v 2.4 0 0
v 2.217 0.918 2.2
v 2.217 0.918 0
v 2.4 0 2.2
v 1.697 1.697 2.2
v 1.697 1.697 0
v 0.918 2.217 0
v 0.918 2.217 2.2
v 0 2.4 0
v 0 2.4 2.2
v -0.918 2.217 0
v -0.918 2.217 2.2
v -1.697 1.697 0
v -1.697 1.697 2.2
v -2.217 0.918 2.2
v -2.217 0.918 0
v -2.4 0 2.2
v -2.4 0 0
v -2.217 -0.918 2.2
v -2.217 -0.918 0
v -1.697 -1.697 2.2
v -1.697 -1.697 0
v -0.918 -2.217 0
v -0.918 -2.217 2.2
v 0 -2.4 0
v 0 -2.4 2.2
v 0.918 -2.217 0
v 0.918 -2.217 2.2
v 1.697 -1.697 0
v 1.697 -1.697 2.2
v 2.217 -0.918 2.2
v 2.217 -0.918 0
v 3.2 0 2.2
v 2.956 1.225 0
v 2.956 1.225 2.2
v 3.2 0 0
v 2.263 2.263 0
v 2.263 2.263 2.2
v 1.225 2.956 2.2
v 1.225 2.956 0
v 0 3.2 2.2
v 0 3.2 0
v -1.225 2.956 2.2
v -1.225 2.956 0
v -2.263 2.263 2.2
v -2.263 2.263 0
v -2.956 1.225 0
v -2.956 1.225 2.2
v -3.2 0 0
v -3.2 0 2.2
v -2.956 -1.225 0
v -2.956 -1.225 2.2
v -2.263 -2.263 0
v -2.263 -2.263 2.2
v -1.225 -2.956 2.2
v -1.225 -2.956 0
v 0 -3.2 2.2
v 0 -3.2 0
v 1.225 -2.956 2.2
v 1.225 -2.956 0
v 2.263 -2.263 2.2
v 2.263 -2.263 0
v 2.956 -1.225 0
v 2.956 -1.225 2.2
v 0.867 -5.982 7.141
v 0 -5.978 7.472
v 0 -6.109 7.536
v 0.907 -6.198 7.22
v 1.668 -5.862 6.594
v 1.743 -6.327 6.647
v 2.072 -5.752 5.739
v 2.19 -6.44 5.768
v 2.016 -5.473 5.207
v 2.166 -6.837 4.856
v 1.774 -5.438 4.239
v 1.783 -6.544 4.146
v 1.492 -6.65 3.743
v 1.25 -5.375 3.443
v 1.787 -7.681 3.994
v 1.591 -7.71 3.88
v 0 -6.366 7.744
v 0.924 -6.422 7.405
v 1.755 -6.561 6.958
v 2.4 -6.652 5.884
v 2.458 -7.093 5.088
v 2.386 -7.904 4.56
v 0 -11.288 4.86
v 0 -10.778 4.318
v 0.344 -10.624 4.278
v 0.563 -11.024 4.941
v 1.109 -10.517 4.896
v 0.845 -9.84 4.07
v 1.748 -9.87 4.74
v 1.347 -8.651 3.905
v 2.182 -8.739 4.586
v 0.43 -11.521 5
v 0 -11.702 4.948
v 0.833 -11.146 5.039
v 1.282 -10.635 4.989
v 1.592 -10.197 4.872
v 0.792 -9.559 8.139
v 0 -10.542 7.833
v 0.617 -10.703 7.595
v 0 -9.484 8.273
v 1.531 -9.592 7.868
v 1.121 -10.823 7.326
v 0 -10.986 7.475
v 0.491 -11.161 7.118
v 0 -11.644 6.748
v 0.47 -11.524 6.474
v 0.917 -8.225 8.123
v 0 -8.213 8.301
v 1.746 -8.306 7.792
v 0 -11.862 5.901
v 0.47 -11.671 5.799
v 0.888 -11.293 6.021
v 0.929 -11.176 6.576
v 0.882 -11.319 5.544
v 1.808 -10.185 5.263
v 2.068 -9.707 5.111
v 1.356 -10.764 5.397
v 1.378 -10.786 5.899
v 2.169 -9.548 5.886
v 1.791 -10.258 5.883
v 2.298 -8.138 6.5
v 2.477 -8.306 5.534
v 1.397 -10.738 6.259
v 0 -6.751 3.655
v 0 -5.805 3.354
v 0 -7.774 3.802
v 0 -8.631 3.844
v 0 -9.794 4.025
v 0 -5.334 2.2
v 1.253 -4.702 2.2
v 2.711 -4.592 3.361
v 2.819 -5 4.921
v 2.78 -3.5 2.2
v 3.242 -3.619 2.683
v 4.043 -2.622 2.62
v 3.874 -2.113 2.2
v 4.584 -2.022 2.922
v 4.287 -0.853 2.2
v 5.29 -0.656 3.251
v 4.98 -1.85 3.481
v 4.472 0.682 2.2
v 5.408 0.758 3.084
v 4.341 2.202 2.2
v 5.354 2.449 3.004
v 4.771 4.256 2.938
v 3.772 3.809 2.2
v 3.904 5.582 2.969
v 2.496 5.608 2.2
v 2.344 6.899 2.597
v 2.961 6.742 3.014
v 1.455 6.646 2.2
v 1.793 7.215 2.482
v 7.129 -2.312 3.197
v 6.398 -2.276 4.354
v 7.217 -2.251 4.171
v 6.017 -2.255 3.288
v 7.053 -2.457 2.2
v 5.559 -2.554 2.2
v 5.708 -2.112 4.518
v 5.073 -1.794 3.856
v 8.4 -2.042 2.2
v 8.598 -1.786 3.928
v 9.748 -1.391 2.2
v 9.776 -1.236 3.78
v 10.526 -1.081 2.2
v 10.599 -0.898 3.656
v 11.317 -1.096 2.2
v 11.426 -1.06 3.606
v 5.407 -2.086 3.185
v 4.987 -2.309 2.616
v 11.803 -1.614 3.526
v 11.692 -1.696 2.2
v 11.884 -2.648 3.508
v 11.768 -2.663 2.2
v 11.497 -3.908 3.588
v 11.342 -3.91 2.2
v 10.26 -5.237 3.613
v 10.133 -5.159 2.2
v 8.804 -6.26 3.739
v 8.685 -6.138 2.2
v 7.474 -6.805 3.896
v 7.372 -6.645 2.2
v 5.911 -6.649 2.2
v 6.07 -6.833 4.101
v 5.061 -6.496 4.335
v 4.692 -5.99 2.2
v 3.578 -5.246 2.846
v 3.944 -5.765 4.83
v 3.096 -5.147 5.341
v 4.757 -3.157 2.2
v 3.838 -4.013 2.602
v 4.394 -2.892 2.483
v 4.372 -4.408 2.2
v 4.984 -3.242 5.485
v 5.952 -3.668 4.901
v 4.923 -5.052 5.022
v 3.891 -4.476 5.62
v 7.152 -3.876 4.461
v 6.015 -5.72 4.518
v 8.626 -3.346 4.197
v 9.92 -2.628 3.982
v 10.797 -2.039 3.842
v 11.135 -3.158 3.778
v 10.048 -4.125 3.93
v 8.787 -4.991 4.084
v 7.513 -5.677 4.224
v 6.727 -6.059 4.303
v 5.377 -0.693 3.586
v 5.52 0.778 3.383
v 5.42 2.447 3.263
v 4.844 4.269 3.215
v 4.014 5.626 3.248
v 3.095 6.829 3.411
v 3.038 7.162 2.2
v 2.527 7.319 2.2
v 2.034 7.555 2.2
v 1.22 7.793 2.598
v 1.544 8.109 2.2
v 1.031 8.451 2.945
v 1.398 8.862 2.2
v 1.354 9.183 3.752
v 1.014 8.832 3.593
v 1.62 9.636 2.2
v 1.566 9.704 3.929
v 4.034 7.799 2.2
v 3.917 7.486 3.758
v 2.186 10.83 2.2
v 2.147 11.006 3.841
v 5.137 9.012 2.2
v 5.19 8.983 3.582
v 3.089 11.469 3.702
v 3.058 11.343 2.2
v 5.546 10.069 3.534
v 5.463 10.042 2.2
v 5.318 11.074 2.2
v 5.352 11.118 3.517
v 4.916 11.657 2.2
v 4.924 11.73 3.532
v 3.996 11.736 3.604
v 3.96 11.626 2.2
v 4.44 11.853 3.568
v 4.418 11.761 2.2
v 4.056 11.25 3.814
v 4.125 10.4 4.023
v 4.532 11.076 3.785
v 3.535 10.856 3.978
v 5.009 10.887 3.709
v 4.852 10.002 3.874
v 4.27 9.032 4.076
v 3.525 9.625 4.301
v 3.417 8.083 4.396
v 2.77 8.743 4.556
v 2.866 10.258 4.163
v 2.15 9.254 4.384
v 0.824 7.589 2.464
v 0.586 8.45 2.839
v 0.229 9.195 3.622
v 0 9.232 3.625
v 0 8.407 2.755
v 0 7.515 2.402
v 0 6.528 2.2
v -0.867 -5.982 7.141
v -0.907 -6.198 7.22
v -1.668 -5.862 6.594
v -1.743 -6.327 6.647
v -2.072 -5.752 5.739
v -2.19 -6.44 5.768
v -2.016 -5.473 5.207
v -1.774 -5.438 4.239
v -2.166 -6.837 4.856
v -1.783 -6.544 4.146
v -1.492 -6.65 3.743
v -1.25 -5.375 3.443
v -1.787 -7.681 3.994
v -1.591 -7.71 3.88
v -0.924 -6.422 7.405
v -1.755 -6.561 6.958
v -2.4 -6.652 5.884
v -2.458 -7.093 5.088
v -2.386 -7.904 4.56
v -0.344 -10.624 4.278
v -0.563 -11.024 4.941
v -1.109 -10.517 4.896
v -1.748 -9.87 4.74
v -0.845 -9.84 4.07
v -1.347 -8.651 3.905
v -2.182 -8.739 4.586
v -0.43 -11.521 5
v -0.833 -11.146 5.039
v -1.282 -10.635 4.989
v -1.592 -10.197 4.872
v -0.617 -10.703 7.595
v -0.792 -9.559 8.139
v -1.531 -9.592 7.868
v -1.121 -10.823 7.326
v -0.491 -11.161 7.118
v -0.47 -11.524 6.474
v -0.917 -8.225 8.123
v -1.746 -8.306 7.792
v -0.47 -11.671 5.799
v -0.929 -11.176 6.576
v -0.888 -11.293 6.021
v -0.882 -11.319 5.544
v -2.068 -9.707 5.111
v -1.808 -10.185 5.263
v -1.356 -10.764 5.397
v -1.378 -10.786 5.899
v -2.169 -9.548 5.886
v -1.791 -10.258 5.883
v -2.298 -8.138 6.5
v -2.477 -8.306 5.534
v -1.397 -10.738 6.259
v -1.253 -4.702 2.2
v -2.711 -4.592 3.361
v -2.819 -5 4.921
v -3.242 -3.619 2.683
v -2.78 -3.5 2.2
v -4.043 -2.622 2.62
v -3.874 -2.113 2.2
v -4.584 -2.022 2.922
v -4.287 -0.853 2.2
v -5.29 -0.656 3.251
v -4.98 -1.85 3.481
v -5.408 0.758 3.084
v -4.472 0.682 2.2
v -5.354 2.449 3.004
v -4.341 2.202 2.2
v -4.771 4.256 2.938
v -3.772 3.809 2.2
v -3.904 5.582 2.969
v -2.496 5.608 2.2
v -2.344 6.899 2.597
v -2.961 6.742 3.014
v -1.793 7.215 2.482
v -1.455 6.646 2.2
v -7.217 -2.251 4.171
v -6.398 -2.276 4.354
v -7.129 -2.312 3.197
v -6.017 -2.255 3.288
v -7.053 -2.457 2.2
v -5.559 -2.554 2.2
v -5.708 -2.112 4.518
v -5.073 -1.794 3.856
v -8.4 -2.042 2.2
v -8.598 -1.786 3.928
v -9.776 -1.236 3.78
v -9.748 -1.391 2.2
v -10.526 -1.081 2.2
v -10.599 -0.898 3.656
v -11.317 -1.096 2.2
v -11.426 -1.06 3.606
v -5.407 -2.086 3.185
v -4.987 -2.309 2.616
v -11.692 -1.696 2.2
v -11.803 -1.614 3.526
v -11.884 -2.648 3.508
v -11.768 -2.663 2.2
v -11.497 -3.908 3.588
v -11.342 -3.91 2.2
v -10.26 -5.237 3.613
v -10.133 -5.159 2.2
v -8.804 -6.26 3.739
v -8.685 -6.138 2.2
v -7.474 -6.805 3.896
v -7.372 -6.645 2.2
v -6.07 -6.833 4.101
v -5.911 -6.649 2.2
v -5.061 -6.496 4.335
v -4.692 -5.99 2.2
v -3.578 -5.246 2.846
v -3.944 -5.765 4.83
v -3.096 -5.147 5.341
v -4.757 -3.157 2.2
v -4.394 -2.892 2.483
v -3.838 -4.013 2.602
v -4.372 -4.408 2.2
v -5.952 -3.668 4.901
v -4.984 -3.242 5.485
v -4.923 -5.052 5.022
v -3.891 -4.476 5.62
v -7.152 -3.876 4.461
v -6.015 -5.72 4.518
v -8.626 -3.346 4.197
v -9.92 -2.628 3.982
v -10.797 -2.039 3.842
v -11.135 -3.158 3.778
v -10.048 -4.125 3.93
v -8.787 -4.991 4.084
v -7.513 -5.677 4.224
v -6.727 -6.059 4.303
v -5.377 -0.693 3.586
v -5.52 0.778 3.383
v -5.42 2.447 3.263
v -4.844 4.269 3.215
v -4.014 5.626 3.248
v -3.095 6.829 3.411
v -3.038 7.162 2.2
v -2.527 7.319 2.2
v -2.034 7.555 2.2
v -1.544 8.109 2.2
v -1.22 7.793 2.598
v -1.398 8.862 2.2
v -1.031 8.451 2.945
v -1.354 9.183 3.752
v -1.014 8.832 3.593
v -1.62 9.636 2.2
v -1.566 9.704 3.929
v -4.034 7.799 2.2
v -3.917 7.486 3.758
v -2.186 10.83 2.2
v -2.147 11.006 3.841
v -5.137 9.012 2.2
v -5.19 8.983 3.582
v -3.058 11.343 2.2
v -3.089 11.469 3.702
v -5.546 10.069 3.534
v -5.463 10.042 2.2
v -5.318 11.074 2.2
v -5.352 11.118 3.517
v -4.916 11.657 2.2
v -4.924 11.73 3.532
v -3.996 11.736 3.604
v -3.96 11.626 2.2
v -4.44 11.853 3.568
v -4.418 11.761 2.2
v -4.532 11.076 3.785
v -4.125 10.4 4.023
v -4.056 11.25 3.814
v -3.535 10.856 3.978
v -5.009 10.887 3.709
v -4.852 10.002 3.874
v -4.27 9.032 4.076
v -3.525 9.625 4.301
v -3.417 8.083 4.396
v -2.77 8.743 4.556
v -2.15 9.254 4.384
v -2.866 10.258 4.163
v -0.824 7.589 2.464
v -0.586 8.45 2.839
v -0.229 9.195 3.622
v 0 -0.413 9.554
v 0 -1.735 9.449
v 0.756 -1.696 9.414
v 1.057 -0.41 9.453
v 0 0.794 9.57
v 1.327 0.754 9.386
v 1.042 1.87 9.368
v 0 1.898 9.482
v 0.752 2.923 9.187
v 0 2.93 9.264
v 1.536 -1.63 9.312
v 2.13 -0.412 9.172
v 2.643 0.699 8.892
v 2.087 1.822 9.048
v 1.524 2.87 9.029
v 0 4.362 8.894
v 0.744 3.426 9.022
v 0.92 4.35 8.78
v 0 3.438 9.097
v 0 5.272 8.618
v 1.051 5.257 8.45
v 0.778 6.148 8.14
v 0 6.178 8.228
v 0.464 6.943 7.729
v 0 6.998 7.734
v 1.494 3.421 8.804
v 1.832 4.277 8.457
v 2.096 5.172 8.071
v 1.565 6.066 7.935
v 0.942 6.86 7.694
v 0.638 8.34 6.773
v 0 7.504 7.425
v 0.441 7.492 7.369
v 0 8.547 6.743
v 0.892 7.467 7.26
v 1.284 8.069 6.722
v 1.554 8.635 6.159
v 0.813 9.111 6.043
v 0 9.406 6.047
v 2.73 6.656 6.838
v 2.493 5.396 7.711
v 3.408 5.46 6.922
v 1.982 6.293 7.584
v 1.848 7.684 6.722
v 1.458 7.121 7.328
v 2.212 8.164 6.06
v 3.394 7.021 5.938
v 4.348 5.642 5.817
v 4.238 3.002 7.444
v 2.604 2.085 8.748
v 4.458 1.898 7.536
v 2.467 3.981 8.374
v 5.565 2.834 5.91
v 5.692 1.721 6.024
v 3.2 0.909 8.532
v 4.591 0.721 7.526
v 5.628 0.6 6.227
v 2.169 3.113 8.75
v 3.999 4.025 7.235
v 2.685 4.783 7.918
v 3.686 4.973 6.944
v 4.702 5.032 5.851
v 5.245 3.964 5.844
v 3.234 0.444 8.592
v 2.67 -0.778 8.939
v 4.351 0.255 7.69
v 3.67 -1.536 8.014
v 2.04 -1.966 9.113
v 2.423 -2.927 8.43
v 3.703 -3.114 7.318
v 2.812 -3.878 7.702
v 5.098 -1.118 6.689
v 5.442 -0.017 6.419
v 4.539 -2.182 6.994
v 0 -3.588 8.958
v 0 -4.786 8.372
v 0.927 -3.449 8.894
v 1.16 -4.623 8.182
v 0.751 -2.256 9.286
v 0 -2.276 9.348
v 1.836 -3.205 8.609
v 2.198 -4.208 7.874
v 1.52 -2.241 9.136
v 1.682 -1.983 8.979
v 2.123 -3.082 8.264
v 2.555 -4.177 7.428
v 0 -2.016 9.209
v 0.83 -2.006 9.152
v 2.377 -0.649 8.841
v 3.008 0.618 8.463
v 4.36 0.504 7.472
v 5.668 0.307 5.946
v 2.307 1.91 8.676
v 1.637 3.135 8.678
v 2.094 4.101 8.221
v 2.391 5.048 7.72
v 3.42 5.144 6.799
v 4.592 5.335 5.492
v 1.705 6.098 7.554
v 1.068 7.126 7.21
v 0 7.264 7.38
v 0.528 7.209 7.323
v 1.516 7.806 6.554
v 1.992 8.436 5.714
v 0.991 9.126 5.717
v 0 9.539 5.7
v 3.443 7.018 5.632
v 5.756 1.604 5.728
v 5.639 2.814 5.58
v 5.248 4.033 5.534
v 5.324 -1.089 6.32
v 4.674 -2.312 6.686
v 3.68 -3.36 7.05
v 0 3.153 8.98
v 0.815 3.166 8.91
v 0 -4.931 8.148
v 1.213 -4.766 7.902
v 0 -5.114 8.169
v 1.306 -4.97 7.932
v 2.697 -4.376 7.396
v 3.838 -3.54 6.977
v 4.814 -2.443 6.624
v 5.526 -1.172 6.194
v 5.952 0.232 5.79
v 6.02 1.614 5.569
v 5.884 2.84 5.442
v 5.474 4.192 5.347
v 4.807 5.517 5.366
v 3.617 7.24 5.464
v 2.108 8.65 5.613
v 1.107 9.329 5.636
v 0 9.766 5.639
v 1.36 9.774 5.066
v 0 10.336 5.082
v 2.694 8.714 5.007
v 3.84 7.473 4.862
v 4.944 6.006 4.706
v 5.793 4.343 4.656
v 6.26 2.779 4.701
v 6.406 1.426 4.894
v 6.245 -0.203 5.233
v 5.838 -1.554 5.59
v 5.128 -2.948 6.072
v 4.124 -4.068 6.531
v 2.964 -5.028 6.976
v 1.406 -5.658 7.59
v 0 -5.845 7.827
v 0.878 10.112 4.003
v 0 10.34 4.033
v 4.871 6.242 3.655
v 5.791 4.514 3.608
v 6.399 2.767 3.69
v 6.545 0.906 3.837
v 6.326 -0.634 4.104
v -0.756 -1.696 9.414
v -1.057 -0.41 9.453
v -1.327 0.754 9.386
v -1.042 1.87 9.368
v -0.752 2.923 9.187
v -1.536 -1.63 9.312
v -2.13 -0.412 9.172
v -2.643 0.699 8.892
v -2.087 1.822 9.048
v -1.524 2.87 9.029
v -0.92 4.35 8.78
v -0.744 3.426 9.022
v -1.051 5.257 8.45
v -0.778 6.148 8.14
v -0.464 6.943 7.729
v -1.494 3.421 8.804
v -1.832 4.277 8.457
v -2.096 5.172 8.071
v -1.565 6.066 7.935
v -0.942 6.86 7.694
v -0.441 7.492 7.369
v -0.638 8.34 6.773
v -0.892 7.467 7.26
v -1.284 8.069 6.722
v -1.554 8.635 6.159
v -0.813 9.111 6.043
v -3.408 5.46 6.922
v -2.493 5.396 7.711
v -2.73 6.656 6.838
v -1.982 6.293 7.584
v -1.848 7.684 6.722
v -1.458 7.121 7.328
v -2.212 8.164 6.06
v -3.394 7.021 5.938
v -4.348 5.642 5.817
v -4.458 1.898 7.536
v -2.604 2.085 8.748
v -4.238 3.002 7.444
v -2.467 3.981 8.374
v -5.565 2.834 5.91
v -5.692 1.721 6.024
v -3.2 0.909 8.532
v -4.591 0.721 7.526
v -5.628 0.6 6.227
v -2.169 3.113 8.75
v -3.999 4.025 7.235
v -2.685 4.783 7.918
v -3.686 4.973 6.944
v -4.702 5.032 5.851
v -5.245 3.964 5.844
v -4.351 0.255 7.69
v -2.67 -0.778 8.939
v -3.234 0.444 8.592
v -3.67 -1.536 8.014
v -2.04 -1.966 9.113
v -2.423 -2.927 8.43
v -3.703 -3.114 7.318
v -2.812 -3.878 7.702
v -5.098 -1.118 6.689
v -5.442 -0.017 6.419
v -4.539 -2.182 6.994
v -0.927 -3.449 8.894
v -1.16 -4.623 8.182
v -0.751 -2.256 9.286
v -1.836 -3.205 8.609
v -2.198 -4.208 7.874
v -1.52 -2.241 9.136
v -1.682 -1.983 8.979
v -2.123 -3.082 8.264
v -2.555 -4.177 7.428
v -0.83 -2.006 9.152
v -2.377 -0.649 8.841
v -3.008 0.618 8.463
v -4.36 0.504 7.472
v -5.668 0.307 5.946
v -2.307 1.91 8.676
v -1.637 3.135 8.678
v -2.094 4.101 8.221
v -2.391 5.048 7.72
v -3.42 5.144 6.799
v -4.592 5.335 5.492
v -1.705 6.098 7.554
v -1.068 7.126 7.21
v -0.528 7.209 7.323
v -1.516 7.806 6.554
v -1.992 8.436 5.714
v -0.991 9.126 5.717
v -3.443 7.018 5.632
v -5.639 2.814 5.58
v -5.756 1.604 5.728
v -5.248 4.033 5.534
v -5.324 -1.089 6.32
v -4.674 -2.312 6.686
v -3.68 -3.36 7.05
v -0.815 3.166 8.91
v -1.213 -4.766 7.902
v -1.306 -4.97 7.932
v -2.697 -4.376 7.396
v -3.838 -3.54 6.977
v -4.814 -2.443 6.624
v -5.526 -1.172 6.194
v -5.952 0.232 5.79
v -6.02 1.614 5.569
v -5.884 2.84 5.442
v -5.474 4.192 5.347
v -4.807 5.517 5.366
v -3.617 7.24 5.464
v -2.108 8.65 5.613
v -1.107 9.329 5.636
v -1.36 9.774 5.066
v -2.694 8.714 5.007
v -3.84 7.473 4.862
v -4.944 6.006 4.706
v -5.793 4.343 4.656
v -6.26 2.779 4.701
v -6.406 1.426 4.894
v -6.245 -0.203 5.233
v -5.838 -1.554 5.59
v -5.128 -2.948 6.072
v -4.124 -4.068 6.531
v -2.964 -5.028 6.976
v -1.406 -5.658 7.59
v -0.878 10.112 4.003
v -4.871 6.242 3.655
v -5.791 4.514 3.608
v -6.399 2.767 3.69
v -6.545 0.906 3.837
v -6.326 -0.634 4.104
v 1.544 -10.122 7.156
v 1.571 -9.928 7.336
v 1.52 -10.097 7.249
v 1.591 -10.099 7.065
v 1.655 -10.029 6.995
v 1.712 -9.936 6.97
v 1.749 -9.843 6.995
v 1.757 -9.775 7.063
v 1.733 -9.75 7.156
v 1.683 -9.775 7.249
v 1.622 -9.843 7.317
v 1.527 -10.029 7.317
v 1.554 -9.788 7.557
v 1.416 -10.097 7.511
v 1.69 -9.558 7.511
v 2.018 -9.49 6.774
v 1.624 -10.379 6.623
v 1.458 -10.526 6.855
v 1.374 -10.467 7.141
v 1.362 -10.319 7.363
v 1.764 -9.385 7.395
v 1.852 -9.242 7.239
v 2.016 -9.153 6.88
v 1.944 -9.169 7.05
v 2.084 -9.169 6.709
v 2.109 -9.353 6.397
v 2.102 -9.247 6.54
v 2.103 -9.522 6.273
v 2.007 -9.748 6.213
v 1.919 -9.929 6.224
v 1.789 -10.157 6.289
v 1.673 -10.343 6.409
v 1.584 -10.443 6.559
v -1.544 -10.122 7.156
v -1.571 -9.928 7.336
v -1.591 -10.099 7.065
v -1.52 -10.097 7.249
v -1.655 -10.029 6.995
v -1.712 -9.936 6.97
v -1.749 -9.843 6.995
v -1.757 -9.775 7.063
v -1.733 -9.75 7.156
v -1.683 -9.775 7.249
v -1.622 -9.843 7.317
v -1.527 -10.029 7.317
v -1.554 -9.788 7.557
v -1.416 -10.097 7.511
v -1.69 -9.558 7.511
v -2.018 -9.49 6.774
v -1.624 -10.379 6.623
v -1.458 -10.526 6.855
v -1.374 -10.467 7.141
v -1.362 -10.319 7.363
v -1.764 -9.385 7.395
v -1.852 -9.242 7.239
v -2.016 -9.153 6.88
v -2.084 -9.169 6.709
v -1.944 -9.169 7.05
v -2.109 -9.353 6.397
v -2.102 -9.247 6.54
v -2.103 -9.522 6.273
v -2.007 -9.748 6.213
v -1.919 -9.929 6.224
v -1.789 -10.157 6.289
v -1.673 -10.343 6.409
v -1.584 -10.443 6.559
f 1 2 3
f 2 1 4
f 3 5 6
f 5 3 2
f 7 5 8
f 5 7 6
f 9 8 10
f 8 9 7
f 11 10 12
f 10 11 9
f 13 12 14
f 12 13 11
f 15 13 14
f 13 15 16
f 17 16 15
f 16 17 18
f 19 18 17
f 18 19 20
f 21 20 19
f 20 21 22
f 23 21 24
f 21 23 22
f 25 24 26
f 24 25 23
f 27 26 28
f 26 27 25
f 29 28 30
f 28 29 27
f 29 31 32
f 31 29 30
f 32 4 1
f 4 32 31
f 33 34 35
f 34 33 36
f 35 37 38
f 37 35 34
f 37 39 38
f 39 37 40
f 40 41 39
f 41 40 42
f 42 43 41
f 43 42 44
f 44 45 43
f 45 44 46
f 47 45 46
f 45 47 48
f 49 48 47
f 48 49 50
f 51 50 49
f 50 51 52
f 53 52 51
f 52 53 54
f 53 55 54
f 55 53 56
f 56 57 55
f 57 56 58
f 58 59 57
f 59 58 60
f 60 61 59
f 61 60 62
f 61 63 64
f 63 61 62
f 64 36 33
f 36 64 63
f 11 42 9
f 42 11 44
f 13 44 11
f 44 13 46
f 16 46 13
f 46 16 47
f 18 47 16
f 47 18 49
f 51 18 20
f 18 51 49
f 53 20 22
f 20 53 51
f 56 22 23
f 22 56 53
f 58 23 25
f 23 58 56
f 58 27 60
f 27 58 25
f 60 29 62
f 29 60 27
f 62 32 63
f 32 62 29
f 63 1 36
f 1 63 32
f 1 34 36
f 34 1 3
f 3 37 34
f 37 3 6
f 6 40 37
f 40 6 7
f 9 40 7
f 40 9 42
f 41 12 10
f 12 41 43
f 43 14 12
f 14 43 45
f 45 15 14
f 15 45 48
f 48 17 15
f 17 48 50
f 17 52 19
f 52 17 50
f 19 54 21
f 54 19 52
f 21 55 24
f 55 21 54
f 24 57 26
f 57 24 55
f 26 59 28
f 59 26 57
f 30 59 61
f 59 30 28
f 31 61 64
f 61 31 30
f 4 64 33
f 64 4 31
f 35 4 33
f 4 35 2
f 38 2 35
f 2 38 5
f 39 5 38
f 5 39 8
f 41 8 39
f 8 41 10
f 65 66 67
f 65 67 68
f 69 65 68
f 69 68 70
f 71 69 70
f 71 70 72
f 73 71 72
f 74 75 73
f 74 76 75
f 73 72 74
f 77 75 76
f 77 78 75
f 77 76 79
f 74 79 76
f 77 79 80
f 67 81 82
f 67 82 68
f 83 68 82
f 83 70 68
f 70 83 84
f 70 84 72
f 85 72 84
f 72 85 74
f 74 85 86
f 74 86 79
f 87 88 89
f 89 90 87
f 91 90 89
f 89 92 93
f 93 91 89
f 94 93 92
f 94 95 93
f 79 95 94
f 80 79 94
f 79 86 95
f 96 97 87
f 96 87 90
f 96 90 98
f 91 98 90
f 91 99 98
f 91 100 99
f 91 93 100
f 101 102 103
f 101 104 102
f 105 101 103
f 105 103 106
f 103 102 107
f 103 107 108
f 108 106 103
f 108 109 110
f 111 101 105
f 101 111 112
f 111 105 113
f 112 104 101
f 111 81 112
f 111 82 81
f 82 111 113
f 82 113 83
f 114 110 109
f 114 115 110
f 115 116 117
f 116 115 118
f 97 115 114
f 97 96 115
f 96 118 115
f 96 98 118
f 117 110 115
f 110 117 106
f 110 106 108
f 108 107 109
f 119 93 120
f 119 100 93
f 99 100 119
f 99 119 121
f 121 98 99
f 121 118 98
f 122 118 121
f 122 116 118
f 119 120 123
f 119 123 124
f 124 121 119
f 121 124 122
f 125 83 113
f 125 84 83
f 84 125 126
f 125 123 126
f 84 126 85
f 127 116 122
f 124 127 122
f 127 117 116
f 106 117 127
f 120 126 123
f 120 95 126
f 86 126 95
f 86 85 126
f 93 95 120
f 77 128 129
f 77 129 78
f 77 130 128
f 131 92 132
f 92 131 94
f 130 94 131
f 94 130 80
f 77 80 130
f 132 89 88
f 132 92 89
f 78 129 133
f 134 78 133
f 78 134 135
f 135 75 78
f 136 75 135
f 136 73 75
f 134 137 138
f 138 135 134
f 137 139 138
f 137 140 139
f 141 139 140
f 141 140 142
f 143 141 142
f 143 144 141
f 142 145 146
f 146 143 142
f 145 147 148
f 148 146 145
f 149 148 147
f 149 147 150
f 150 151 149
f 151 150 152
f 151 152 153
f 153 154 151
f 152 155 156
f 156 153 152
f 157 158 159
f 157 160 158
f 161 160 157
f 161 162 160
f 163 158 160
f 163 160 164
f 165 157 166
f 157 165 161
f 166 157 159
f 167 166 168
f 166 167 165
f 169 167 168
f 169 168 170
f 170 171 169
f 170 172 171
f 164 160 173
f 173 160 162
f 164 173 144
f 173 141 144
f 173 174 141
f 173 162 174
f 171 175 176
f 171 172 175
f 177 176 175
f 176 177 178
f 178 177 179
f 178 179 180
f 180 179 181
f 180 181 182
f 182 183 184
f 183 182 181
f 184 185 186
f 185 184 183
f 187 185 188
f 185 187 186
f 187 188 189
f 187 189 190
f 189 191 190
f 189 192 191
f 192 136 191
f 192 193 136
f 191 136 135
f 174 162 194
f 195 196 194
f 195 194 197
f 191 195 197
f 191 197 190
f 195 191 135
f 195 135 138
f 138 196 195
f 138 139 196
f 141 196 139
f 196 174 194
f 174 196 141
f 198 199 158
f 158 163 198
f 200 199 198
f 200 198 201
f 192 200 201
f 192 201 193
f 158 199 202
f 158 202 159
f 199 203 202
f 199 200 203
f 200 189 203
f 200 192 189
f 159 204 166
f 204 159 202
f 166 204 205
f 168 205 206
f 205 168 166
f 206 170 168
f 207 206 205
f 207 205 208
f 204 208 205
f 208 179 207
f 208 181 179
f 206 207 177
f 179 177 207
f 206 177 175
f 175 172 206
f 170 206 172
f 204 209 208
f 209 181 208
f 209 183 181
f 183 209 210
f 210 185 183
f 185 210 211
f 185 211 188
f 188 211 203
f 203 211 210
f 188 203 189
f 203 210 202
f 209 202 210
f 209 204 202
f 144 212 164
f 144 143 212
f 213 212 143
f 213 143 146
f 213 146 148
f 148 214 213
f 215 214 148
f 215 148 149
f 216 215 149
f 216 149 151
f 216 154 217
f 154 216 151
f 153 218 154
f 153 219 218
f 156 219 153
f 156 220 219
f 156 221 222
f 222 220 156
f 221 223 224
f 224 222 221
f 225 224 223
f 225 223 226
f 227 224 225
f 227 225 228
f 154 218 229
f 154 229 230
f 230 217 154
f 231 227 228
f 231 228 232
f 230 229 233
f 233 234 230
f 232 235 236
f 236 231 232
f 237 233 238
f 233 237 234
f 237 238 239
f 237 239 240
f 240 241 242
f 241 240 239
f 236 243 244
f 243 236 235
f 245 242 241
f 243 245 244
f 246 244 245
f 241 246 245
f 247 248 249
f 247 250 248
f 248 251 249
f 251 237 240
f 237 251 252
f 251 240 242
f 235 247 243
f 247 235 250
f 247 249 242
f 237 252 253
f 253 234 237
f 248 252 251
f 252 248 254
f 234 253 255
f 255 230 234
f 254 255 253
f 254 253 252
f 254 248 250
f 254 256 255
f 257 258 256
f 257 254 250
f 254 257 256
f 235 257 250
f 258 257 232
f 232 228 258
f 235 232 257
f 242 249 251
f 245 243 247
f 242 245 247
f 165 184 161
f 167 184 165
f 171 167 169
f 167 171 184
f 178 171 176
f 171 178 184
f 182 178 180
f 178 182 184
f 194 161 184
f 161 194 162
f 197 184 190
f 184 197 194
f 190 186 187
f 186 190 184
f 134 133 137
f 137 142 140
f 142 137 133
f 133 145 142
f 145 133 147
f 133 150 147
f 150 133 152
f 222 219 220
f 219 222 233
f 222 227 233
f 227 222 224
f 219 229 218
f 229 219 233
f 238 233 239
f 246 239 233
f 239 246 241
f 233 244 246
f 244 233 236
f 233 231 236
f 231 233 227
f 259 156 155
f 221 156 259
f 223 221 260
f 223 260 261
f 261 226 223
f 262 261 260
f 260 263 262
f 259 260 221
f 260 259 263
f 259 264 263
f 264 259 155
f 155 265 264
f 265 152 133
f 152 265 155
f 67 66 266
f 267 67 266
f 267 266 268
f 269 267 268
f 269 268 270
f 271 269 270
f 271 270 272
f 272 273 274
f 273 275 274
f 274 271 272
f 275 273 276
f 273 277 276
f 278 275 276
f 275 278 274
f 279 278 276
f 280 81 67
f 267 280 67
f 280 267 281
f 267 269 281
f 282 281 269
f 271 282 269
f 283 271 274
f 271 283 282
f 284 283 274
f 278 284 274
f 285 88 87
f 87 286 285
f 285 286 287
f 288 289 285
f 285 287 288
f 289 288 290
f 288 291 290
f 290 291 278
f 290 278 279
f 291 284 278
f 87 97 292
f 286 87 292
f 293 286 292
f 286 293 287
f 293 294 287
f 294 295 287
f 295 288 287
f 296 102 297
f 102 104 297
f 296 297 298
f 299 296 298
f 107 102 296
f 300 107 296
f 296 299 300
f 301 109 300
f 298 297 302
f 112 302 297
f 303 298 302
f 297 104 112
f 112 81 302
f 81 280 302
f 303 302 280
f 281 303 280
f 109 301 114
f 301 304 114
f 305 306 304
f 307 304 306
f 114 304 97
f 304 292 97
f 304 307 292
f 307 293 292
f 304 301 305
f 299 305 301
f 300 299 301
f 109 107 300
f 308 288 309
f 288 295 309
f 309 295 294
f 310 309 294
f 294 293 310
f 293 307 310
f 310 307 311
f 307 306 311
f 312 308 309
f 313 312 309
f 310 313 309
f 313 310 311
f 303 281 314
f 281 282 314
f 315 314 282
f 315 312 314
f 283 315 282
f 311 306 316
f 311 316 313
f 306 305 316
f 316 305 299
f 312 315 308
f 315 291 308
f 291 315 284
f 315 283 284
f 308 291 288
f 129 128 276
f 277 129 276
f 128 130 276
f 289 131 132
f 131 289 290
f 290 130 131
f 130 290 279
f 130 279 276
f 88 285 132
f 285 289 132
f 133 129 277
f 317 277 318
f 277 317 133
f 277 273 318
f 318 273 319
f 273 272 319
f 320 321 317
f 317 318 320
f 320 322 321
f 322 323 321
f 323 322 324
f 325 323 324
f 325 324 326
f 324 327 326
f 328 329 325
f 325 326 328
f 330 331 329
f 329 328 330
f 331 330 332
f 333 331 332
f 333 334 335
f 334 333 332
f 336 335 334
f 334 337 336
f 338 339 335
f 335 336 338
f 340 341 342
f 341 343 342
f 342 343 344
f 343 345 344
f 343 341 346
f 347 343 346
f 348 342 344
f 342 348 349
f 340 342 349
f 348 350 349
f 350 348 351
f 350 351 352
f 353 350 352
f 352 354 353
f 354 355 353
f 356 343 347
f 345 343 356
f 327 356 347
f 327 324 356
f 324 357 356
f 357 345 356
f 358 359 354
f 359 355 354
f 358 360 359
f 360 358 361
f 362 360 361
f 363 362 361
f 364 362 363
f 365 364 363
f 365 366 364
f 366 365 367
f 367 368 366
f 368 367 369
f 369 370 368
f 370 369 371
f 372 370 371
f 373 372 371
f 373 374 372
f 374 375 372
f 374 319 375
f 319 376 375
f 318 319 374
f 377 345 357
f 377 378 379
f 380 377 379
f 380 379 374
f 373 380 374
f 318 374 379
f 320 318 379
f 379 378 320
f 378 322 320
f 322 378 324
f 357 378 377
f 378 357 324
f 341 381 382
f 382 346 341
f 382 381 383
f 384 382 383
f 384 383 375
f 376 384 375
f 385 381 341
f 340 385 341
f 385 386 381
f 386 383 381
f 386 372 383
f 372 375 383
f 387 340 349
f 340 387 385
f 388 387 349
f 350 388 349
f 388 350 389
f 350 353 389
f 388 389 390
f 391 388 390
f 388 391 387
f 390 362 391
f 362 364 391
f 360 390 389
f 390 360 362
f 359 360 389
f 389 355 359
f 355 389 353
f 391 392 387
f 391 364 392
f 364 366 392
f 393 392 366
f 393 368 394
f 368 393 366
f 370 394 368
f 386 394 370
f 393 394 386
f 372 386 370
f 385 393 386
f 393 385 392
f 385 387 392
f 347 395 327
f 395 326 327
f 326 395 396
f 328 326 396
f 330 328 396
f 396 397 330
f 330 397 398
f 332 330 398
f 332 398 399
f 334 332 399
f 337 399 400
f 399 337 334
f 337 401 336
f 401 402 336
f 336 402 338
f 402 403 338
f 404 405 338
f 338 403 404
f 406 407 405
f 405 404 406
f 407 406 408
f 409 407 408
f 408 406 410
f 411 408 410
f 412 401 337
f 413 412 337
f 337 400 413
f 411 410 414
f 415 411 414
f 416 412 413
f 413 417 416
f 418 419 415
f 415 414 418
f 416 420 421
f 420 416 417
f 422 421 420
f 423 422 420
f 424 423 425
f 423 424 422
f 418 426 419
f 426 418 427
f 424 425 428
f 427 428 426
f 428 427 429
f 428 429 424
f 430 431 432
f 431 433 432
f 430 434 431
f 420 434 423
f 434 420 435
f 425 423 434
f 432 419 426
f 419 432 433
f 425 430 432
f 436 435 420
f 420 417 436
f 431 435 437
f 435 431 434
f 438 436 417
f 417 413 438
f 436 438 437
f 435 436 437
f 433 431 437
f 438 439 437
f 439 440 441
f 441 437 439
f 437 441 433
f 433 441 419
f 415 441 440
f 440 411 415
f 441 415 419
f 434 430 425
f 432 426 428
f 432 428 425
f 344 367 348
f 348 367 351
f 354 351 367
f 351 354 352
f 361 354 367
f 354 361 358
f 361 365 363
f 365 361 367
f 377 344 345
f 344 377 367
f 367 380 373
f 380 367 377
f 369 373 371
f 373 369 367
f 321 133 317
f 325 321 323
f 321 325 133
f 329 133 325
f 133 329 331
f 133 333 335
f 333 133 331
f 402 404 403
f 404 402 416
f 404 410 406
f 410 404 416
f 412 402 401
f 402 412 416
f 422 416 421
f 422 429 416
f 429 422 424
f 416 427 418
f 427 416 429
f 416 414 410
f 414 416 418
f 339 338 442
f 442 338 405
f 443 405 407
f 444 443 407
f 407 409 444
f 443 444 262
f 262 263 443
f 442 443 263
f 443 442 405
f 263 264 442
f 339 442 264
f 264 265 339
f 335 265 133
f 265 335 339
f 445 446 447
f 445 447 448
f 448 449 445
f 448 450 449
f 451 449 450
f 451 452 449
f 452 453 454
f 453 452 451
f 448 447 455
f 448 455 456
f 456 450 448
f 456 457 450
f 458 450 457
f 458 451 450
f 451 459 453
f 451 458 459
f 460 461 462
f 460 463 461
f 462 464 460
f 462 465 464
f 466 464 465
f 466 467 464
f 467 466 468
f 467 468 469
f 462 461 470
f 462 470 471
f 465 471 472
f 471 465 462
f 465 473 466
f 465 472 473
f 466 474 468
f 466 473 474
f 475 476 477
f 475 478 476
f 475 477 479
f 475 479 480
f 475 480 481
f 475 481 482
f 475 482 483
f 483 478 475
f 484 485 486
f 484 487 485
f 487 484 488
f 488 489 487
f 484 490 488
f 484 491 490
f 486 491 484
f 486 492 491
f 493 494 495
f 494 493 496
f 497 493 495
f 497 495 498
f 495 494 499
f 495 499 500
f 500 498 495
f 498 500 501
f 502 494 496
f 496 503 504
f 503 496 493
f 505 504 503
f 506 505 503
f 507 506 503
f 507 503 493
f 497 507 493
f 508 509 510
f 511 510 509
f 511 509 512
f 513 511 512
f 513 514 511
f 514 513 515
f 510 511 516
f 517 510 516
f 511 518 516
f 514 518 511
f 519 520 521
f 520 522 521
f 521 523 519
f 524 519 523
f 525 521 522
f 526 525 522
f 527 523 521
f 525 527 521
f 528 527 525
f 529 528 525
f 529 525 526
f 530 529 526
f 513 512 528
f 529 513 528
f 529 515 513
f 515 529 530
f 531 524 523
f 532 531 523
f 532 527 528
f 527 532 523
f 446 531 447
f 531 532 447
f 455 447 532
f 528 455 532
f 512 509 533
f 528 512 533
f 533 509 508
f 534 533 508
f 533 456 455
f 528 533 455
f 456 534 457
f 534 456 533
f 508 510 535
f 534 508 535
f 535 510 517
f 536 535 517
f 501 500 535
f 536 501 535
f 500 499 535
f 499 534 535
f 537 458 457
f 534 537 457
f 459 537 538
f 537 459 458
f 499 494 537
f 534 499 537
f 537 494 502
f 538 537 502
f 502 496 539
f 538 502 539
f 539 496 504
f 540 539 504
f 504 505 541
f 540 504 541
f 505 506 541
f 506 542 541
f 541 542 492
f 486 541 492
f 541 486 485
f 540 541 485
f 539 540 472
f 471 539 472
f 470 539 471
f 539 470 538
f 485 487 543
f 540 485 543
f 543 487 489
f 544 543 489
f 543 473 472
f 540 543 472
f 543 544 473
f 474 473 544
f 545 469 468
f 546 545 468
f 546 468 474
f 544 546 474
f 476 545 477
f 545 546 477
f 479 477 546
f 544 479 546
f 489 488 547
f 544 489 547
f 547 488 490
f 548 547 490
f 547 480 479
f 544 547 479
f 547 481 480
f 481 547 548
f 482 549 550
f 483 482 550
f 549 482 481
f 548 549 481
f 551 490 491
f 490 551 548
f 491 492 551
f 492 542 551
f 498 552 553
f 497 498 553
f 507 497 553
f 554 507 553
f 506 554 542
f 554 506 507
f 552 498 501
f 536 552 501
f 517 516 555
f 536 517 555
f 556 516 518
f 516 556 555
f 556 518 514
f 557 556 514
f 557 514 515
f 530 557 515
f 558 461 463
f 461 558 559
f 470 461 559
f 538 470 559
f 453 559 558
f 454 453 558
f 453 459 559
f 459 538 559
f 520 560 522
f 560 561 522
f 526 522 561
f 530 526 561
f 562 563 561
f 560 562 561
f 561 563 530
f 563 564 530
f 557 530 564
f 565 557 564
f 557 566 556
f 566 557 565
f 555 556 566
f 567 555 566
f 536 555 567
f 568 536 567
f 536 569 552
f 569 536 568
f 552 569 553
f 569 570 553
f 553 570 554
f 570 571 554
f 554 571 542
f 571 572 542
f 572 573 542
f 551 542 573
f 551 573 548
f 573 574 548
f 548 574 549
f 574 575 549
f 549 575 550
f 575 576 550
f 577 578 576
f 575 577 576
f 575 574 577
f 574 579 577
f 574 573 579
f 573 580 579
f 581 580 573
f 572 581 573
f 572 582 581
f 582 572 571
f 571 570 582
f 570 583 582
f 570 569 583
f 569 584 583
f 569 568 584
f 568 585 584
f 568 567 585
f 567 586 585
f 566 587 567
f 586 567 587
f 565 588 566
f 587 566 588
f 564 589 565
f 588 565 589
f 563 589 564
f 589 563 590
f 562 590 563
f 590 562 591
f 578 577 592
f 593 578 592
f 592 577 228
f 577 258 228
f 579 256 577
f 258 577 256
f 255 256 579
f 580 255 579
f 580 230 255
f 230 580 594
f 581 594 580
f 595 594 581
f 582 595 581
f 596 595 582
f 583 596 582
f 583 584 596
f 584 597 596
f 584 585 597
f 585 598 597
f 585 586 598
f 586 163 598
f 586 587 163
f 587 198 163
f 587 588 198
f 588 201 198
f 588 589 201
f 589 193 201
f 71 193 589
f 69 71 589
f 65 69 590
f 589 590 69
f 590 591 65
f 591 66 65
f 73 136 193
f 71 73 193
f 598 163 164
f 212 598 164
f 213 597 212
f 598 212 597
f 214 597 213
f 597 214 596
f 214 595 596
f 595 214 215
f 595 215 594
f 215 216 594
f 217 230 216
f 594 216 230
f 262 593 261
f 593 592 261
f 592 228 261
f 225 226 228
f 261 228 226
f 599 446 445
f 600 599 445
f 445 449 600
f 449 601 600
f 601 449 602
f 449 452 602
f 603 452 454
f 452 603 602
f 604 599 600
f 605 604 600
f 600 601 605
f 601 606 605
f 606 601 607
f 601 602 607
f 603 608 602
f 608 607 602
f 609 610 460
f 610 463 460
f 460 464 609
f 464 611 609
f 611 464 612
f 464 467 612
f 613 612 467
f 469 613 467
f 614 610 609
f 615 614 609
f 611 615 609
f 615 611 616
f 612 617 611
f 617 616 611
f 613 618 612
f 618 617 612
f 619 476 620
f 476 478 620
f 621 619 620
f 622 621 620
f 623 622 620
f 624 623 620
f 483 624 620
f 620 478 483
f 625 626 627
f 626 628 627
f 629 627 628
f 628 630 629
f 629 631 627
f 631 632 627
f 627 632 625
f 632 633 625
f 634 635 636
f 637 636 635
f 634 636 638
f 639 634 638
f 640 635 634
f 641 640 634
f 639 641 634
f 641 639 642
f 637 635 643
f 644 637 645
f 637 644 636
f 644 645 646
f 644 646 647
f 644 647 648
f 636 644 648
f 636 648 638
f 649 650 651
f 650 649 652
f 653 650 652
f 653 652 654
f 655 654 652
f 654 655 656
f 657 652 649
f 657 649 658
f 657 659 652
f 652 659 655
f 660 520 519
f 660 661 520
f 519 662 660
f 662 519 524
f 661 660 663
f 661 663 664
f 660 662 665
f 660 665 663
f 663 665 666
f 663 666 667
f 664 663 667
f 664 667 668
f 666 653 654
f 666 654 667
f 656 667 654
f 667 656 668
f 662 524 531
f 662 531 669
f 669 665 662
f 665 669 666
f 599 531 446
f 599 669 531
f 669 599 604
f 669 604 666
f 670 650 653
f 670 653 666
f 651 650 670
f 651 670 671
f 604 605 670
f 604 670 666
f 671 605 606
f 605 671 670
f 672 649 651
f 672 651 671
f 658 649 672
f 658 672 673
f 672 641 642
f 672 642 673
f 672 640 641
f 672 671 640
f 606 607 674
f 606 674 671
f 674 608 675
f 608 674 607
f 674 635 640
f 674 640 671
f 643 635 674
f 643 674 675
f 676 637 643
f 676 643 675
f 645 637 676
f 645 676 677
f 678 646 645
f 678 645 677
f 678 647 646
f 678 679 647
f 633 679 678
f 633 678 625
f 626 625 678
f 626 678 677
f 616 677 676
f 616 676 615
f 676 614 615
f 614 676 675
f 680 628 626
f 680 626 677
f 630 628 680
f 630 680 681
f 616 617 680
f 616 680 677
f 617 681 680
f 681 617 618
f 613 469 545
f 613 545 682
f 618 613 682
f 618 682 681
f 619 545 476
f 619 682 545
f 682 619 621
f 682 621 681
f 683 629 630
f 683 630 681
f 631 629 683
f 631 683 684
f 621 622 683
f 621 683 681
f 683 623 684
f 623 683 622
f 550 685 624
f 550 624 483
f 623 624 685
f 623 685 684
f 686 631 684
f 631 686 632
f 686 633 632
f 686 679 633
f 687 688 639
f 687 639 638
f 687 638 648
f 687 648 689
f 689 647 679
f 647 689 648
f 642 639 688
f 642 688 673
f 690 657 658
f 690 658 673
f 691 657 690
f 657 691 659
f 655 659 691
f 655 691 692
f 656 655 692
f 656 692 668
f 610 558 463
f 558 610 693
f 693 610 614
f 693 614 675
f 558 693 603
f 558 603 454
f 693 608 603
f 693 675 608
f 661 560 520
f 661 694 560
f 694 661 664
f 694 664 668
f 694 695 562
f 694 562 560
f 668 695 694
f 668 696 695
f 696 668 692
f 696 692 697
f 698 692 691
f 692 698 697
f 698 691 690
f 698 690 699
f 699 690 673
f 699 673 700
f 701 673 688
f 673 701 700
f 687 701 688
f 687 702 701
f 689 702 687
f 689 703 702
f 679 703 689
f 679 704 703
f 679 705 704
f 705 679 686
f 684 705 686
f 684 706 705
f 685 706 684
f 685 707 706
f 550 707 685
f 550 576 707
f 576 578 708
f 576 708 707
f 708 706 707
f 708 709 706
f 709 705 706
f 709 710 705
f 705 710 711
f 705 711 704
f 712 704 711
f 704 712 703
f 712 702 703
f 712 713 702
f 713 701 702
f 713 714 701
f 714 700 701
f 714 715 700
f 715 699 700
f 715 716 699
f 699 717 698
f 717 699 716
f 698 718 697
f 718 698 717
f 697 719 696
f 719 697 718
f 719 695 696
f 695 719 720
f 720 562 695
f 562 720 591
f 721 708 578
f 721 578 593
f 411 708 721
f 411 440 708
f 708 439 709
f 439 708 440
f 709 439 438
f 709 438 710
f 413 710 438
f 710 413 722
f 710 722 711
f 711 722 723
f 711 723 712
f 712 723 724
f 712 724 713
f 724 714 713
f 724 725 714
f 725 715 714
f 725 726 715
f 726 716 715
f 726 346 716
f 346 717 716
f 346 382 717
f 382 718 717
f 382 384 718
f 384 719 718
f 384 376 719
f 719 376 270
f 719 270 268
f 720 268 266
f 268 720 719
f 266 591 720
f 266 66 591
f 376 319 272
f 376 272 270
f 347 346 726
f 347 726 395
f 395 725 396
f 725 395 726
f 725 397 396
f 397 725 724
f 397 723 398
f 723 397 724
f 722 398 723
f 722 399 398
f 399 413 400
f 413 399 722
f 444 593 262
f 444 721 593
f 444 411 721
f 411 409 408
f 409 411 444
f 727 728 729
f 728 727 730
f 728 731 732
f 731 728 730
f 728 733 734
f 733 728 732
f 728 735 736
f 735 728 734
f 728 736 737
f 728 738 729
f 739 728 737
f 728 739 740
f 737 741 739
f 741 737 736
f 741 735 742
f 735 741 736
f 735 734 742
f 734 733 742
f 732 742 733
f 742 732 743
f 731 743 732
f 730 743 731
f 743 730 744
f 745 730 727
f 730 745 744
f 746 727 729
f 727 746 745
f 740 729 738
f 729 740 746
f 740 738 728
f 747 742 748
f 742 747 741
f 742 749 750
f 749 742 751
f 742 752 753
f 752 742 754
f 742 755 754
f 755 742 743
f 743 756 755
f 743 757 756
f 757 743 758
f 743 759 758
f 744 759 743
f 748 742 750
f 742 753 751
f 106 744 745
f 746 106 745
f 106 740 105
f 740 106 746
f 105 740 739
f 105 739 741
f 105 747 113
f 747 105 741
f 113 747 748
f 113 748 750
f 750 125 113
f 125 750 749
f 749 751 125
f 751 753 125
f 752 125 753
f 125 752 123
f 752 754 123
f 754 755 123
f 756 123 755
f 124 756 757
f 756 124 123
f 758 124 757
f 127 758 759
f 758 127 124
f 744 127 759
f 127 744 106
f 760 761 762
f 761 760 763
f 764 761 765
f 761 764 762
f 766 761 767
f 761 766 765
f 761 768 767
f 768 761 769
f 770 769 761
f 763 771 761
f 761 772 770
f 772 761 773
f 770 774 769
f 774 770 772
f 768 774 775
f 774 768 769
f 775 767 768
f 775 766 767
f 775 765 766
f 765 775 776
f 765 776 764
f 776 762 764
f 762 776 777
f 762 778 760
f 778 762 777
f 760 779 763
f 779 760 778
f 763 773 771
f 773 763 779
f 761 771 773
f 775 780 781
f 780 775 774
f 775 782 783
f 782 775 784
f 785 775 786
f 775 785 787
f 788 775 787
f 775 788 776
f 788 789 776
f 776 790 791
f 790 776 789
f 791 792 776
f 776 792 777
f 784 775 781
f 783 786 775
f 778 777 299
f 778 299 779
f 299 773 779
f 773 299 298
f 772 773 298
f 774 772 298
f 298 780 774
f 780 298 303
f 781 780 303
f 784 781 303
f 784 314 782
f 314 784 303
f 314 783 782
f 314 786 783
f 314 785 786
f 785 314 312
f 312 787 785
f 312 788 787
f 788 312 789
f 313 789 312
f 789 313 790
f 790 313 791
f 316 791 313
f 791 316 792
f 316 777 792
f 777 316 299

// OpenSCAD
use <../lib.scad>
use <s/67040p01s01.scad>
use <s/67040s01.scad>
use <s/67040s02.scad>
use <../p/stud4.scad>
function ldraw_lib__67040p01() = [
// 0 Animal Sea Turtle Baby with Black Eyes and Medium Nougat Shell Pattern
// 0 Name: 67040p01.dat
// 0 Author: Philippe Hurbain [Philo]
// 0 !LDRAW_ORG Part UPDATE 2024-02
// 0 !LICENSE Licensed under CC BY 4.0 : see CAreadme.txt
// 
// 0 BFC CERTIFY CCW
  [0,"BFC","CERTIFY"],
  [0,"BFC","CCW"],
// 
// 0 !KEYWORDS Bricklink 67040pb01, CMF series 20, Rebrickable 67040pr0001
// 0 !KEYWORDS Set 60377
// 
// 0 !HISTORY 2024-03-24 [OrionP] Official Update 2024-02
// 
// 1 16 0 -5.5 0 1 0 0 0 -1.375 0 0 0 1 stud4.dat
  [1,16,0,-5.5,0,1,0,0,0,-1.375,0,0,0,1, ldraw_lib__stud4()],
// 1 16 0 0 0 1 0 0 0 1 0 0 0 1 s\67040s01.dat
  [1,16,0,0,0,1,0,0,0,1,0,0,0,1, ldraw_lib__s__67040s01()],
// 1 16 0 0 0 -1 0 0 0 1 0 0 0 1 s\67040s01.dat
  [1,16,0,0,0,-1,0,0,0,1,0,0,0,1, ldraw_lib__s__67040s01()],
// 
// 1 84 0 0 0 1 0 0 0 1 0 0 0 1 s\67040s02.dat
  [1,84,0,0,0,1,0,0,0,1,0,0,0,1, ldraw_lib__s__67040s02()],
// 1 84 0 0 0 -1 0 0 0 1 0 0 0 1 s\67040s02.dat
  [1,84,0,0,0,-1,0,0,0,1,0,0,0,1, ldraw_lib__s__67040s02()],
// 
// 1 16 0 0 0 1 0 0 0 1 0 0 0 1 s\67040p01s01.dat
  [1,16,0,0,0,1,0,0,0,1,0,0,0,1, ldraw_lib__s__67040p01s01()],
// 1 16 0 0 0 -1 0 0 0 1 0 0 0 1 s\67040p01s01.dat
  [1,16,0,0,0,-1,0,0,0,1,0,0,0,1, ldraw_lib__s__67040p01s01()],
];
module ldraw_lib__67040p01(step=0, col=false, unit=2/5, alt=false, line=0.2, solid=!$preview)
    makepoly(ldraw_lib__67040p01(), step=step, col=col, unit=unit, alt=alt, line=line, solid=solid);
ldraw_lib__67040p01(line=0.2);
